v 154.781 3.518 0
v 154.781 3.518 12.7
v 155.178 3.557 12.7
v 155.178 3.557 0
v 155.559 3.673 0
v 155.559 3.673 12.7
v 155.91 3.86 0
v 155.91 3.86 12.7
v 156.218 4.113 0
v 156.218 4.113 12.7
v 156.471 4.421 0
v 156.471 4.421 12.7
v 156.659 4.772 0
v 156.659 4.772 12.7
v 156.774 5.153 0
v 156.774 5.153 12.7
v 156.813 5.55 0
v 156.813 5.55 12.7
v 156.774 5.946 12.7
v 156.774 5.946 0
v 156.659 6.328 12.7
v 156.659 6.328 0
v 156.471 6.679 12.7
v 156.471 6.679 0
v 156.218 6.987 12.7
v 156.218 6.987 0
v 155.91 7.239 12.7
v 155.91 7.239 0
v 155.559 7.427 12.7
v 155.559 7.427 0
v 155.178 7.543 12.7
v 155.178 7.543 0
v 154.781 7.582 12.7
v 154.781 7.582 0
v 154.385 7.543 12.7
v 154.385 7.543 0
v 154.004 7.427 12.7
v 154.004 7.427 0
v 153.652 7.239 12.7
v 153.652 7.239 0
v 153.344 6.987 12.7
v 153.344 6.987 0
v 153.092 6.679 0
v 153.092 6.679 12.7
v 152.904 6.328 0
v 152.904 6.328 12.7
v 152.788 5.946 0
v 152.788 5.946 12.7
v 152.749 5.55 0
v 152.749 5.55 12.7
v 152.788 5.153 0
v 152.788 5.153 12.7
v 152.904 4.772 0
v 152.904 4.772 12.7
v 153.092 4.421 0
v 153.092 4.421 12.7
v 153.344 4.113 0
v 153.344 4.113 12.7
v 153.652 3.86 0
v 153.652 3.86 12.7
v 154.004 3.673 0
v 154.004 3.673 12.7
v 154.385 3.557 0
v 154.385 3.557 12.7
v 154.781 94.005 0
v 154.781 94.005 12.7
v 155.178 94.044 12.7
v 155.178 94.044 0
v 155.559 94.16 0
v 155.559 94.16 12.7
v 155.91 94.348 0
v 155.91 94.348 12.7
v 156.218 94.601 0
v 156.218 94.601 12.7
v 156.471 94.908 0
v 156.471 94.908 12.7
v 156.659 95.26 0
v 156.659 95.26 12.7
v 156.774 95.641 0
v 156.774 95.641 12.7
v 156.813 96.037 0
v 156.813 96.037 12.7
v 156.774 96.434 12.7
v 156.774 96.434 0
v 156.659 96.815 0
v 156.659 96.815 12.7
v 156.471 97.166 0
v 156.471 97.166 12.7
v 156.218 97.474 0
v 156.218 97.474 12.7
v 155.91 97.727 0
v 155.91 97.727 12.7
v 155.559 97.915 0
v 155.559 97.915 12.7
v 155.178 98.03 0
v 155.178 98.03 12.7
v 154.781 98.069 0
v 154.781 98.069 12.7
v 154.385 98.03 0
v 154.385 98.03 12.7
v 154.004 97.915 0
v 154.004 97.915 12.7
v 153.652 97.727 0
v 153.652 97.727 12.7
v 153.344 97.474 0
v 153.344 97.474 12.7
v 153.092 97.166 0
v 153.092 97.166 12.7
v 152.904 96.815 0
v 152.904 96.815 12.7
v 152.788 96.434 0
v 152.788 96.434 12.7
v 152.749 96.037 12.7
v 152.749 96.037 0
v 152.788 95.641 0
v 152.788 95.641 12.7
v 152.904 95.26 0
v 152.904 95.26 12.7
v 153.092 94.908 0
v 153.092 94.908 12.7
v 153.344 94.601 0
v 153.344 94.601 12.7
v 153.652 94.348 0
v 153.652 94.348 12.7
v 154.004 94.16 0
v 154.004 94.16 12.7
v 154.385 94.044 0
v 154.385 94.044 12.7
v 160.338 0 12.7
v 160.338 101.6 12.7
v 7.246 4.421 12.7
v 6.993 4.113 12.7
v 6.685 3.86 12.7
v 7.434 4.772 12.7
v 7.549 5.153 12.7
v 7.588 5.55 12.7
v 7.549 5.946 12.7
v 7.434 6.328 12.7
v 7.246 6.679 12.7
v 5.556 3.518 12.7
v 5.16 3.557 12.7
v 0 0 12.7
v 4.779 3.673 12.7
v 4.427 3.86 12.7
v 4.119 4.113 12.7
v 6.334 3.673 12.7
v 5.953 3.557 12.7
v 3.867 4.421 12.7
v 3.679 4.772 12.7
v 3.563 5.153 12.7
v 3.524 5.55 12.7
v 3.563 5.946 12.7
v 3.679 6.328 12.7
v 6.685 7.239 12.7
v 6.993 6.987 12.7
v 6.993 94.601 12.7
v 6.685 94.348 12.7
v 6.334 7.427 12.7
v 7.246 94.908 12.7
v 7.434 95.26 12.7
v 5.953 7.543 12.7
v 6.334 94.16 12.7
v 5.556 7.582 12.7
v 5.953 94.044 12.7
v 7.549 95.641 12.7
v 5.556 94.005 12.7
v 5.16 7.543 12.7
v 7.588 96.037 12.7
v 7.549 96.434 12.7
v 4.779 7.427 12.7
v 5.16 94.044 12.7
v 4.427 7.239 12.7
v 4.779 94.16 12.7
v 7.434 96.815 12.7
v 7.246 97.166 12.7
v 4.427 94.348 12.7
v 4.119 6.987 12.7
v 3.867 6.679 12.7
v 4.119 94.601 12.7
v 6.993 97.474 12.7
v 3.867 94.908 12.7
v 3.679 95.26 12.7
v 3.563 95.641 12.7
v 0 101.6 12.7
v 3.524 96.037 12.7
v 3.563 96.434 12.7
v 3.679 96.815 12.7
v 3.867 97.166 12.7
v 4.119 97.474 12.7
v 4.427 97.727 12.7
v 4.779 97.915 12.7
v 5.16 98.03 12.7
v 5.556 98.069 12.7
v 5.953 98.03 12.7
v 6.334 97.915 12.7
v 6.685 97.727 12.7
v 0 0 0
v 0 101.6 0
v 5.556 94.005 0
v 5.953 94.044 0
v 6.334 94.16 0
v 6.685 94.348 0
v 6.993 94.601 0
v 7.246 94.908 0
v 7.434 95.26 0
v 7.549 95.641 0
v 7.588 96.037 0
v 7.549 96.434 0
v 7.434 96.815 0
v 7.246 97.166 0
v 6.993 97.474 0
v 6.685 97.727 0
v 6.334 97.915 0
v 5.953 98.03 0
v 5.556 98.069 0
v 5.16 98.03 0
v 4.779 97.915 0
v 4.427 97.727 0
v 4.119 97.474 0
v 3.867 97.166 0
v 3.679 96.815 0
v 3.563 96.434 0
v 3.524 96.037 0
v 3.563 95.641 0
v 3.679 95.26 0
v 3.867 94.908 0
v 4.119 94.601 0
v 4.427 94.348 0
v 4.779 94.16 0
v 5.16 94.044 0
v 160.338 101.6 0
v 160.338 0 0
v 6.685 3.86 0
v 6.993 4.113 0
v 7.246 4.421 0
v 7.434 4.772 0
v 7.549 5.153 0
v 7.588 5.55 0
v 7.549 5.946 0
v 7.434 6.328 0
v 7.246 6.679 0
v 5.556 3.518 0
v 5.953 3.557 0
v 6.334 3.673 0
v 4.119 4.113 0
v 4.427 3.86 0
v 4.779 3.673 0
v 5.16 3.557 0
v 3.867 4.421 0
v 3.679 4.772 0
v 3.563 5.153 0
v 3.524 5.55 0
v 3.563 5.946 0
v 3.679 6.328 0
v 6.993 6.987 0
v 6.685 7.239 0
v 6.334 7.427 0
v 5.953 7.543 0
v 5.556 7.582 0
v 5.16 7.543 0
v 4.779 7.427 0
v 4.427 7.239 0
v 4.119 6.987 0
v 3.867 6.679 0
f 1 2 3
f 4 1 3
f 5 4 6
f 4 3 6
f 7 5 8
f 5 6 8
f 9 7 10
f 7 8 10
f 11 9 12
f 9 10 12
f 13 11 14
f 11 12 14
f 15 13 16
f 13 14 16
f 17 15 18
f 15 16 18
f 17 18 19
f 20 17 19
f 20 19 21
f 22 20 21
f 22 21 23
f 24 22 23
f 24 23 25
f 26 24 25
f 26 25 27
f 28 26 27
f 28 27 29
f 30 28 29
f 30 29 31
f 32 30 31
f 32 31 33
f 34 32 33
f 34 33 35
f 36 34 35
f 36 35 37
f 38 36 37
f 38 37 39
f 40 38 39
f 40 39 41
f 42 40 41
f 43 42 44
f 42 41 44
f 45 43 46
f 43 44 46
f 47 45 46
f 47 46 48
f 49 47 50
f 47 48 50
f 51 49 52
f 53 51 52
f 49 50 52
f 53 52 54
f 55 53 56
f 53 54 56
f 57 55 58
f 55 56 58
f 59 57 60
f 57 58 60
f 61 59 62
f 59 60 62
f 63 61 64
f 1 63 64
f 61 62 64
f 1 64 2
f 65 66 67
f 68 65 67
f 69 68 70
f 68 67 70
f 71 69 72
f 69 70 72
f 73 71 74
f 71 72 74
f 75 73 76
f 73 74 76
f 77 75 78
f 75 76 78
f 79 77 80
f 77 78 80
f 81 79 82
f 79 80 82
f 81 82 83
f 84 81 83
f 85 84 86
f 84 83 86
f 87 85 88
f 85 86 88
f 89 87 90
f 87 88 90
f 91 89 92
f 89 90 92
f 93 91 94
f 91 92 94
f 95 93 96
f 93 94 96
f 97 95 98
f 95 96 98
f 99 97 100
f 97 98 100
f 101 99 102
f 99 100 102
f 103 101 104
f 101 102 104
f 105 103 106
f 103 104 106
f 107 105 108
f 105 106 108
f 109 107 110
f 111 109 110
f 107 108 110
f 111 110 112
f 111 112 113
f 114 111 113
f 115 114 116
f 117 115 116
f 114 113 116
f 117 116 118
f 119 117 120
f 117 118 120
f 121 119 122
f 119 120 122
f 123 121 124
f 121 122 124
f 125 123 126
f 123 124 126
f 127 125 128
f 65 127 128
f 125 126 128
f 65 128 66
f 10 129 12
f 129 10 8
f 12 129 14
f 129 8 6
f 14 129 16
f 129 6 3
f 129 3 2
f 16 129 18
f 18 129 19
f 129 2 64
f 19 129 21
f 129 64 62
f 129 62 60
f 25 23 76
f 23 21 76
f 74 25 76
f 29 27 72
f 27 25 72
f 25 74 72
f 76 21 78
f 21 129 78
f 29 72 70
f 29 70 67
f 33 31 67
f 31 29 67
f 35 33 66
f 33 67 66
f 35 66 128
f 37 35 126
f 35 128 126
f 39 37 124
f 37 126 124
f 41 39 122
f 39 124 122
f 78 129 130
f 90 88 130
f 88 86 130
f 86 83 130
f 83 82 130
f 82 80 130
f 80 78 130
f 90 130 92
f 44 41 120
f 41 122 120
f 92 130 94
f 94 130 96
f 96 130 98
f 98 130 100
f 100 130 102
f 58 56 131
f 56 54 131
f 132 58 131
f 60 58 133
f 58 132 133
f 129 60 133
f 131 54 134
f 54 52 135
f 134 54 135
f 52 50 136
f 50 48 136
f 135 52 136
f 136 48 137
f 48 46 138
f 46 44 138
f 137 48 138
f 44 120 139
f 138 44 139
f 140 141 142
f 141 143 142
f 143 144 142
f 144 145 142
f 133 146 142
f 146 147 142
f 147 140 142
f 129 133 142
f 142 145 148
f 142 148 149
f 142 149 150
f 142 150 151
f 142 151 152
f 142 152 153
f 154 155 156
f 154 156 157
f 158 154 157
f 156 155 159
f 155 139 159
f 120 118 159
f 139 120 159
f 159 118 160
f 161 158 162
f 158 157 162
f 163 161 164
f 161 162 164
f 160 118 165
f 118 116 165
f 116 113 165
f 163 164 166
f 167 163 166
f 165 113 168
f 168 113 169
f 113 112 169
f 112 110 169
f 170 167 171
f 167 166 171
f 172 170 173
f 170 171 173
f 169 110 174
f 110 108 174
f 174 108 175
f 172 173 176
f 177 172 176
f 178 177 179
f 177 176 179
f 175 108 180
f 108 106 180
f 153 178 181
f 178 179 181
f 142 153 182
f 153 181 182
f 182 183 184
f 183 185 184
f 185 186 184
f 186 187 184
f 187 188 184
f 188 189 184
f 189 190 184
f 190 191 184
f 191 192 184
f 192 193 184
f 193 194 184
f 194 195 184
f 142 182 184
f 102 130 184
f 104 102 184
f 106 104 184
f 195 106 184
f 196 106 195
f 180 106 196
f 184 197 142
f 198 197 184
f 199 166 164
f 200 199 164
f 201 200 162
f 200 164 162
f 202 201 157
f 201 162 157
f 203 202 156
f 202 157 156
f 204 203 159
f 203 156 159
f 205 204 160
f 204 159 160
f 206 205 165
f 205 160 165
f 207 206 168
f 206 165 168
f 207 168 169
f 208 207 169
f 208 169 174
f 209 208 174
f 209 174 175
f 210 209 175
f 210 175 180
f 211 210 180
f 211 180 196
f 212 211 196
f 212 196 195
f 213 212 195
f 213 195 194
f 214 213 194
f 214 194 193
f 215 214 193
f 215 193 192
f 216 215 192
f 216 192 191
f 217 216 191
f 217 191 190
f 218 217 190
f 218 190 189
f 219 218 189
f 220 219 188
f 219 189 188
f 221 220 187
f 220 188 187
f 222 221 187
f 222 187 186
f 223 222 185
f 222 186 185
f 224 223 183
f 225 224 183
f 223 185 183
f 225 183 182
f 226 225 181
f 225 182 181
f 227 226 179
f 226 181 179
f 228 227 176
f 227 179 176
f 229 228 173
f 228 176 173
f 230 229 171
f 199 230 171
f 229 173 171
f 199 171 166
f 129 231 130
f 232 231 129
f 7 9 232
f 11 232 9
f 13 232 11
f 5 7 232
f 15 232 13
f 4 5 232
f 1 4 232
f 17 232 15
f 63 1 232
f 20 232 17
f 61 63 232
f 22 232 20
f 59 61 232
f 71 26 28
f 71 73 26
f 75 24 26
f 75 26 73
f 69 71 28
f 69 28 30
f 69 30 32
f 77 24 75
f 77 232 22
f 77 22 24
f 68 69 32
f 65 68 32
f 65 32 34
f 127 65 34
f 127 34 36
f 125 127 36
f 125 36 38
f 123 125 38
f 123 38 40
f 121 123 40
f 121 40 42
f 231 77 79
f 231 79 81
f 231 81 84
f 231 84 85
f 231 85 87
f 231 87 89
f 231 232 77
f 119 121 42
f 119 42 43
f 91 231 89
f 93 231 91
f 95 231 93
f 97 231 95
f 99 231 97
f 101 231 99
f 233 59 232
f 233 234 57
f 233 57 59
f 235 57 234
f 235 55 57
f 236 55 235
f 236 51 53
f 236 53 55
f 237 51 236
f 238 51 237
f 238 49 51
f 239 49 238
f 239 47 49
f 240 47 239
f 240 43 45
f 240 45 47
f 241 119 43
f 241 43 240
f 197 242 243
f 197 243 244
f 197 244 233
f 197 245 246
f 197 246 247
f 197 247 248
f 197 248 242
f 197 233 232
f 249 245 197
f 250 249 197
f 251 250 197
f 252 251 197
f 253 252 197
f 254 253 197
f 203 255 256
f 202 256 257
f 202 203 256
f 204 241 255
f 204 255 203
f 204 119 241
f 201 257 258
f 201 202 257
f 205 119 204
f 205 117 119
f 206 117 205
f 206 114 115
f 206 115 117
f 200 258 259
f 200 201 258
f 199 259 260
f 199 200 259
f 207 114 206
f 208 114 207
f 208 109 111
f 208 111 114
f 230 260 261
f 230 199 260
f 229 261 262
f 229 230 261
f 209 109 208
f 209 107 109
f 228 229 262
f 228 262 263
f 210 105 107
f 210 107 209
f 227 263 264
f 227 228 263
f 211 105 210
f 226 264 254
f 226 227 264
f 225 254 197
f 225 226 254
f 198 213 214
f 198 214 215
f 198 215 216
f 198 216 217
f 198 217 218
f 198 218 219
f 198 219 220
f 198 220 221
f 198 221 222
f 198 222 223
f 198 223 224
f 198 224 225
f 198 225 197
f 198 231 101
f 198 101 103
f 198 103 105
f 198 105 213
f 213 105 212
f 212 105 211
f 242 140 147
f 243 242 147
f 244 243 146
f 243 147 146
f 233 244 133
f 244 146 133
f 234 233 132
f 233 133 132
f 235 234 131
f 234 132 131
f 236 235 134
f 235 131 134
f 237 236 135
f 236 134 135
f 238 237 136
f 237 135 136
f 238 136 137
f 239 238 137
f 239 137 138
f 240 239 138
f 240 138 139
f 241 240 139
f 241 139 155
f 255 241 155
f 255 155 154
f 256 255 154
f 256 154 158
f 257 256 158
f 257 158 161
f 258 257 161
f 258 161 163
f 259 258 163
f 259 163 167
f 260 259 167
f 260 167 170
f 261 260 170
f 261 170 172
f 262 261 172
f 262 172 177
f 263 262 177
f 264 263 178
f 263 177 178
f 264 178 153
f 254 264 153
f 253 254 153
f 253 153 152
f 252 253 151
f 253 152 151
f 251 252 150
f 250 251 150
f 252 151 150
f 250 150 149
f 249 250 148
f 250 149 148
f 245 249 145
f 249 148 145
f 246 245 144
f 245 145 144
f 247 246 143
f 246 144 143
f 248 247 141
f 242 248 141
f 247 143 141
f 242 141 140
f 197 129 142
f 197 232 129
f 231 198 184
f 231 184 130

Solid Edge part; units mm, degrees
sketch "Sketch1" plane through (0, 0, 0) normal (0, 0, 1) x (1, 0, 0)
  line L0 (0, 0) -> (0, 101.6)
  line L1 (0, 101.6) -> (160.3375, 101.6)
  line L2 (160.3375, 101.6) -> (160.3375, 0)
  line L3 (160.3375, 0) -> (0, 0)
  dimension "D1" = 101.6
  dimension "D2" = 160.3375
extrude "Protrusion1" add sketch "Sketch1" along normal blind 12.7
hole "Hole_1" at (5.5563, 5.5499, 12.7) direction (0, 0, -1) diameter 4.064 end through all
hole "Hole1" at (154.7813, 5.5499, 12.7) direction (0, 0, -1) diameter 4.064 end through all
hole "Hole2" at (154.7813, 96.0374, 12.7) direction (0, 0, -1) diameter 4.064 end through all
hole "Hole3" at (5.5562, 96.0374, 12.7) direction (0, 0, -1) diameter 4.064 end through all
